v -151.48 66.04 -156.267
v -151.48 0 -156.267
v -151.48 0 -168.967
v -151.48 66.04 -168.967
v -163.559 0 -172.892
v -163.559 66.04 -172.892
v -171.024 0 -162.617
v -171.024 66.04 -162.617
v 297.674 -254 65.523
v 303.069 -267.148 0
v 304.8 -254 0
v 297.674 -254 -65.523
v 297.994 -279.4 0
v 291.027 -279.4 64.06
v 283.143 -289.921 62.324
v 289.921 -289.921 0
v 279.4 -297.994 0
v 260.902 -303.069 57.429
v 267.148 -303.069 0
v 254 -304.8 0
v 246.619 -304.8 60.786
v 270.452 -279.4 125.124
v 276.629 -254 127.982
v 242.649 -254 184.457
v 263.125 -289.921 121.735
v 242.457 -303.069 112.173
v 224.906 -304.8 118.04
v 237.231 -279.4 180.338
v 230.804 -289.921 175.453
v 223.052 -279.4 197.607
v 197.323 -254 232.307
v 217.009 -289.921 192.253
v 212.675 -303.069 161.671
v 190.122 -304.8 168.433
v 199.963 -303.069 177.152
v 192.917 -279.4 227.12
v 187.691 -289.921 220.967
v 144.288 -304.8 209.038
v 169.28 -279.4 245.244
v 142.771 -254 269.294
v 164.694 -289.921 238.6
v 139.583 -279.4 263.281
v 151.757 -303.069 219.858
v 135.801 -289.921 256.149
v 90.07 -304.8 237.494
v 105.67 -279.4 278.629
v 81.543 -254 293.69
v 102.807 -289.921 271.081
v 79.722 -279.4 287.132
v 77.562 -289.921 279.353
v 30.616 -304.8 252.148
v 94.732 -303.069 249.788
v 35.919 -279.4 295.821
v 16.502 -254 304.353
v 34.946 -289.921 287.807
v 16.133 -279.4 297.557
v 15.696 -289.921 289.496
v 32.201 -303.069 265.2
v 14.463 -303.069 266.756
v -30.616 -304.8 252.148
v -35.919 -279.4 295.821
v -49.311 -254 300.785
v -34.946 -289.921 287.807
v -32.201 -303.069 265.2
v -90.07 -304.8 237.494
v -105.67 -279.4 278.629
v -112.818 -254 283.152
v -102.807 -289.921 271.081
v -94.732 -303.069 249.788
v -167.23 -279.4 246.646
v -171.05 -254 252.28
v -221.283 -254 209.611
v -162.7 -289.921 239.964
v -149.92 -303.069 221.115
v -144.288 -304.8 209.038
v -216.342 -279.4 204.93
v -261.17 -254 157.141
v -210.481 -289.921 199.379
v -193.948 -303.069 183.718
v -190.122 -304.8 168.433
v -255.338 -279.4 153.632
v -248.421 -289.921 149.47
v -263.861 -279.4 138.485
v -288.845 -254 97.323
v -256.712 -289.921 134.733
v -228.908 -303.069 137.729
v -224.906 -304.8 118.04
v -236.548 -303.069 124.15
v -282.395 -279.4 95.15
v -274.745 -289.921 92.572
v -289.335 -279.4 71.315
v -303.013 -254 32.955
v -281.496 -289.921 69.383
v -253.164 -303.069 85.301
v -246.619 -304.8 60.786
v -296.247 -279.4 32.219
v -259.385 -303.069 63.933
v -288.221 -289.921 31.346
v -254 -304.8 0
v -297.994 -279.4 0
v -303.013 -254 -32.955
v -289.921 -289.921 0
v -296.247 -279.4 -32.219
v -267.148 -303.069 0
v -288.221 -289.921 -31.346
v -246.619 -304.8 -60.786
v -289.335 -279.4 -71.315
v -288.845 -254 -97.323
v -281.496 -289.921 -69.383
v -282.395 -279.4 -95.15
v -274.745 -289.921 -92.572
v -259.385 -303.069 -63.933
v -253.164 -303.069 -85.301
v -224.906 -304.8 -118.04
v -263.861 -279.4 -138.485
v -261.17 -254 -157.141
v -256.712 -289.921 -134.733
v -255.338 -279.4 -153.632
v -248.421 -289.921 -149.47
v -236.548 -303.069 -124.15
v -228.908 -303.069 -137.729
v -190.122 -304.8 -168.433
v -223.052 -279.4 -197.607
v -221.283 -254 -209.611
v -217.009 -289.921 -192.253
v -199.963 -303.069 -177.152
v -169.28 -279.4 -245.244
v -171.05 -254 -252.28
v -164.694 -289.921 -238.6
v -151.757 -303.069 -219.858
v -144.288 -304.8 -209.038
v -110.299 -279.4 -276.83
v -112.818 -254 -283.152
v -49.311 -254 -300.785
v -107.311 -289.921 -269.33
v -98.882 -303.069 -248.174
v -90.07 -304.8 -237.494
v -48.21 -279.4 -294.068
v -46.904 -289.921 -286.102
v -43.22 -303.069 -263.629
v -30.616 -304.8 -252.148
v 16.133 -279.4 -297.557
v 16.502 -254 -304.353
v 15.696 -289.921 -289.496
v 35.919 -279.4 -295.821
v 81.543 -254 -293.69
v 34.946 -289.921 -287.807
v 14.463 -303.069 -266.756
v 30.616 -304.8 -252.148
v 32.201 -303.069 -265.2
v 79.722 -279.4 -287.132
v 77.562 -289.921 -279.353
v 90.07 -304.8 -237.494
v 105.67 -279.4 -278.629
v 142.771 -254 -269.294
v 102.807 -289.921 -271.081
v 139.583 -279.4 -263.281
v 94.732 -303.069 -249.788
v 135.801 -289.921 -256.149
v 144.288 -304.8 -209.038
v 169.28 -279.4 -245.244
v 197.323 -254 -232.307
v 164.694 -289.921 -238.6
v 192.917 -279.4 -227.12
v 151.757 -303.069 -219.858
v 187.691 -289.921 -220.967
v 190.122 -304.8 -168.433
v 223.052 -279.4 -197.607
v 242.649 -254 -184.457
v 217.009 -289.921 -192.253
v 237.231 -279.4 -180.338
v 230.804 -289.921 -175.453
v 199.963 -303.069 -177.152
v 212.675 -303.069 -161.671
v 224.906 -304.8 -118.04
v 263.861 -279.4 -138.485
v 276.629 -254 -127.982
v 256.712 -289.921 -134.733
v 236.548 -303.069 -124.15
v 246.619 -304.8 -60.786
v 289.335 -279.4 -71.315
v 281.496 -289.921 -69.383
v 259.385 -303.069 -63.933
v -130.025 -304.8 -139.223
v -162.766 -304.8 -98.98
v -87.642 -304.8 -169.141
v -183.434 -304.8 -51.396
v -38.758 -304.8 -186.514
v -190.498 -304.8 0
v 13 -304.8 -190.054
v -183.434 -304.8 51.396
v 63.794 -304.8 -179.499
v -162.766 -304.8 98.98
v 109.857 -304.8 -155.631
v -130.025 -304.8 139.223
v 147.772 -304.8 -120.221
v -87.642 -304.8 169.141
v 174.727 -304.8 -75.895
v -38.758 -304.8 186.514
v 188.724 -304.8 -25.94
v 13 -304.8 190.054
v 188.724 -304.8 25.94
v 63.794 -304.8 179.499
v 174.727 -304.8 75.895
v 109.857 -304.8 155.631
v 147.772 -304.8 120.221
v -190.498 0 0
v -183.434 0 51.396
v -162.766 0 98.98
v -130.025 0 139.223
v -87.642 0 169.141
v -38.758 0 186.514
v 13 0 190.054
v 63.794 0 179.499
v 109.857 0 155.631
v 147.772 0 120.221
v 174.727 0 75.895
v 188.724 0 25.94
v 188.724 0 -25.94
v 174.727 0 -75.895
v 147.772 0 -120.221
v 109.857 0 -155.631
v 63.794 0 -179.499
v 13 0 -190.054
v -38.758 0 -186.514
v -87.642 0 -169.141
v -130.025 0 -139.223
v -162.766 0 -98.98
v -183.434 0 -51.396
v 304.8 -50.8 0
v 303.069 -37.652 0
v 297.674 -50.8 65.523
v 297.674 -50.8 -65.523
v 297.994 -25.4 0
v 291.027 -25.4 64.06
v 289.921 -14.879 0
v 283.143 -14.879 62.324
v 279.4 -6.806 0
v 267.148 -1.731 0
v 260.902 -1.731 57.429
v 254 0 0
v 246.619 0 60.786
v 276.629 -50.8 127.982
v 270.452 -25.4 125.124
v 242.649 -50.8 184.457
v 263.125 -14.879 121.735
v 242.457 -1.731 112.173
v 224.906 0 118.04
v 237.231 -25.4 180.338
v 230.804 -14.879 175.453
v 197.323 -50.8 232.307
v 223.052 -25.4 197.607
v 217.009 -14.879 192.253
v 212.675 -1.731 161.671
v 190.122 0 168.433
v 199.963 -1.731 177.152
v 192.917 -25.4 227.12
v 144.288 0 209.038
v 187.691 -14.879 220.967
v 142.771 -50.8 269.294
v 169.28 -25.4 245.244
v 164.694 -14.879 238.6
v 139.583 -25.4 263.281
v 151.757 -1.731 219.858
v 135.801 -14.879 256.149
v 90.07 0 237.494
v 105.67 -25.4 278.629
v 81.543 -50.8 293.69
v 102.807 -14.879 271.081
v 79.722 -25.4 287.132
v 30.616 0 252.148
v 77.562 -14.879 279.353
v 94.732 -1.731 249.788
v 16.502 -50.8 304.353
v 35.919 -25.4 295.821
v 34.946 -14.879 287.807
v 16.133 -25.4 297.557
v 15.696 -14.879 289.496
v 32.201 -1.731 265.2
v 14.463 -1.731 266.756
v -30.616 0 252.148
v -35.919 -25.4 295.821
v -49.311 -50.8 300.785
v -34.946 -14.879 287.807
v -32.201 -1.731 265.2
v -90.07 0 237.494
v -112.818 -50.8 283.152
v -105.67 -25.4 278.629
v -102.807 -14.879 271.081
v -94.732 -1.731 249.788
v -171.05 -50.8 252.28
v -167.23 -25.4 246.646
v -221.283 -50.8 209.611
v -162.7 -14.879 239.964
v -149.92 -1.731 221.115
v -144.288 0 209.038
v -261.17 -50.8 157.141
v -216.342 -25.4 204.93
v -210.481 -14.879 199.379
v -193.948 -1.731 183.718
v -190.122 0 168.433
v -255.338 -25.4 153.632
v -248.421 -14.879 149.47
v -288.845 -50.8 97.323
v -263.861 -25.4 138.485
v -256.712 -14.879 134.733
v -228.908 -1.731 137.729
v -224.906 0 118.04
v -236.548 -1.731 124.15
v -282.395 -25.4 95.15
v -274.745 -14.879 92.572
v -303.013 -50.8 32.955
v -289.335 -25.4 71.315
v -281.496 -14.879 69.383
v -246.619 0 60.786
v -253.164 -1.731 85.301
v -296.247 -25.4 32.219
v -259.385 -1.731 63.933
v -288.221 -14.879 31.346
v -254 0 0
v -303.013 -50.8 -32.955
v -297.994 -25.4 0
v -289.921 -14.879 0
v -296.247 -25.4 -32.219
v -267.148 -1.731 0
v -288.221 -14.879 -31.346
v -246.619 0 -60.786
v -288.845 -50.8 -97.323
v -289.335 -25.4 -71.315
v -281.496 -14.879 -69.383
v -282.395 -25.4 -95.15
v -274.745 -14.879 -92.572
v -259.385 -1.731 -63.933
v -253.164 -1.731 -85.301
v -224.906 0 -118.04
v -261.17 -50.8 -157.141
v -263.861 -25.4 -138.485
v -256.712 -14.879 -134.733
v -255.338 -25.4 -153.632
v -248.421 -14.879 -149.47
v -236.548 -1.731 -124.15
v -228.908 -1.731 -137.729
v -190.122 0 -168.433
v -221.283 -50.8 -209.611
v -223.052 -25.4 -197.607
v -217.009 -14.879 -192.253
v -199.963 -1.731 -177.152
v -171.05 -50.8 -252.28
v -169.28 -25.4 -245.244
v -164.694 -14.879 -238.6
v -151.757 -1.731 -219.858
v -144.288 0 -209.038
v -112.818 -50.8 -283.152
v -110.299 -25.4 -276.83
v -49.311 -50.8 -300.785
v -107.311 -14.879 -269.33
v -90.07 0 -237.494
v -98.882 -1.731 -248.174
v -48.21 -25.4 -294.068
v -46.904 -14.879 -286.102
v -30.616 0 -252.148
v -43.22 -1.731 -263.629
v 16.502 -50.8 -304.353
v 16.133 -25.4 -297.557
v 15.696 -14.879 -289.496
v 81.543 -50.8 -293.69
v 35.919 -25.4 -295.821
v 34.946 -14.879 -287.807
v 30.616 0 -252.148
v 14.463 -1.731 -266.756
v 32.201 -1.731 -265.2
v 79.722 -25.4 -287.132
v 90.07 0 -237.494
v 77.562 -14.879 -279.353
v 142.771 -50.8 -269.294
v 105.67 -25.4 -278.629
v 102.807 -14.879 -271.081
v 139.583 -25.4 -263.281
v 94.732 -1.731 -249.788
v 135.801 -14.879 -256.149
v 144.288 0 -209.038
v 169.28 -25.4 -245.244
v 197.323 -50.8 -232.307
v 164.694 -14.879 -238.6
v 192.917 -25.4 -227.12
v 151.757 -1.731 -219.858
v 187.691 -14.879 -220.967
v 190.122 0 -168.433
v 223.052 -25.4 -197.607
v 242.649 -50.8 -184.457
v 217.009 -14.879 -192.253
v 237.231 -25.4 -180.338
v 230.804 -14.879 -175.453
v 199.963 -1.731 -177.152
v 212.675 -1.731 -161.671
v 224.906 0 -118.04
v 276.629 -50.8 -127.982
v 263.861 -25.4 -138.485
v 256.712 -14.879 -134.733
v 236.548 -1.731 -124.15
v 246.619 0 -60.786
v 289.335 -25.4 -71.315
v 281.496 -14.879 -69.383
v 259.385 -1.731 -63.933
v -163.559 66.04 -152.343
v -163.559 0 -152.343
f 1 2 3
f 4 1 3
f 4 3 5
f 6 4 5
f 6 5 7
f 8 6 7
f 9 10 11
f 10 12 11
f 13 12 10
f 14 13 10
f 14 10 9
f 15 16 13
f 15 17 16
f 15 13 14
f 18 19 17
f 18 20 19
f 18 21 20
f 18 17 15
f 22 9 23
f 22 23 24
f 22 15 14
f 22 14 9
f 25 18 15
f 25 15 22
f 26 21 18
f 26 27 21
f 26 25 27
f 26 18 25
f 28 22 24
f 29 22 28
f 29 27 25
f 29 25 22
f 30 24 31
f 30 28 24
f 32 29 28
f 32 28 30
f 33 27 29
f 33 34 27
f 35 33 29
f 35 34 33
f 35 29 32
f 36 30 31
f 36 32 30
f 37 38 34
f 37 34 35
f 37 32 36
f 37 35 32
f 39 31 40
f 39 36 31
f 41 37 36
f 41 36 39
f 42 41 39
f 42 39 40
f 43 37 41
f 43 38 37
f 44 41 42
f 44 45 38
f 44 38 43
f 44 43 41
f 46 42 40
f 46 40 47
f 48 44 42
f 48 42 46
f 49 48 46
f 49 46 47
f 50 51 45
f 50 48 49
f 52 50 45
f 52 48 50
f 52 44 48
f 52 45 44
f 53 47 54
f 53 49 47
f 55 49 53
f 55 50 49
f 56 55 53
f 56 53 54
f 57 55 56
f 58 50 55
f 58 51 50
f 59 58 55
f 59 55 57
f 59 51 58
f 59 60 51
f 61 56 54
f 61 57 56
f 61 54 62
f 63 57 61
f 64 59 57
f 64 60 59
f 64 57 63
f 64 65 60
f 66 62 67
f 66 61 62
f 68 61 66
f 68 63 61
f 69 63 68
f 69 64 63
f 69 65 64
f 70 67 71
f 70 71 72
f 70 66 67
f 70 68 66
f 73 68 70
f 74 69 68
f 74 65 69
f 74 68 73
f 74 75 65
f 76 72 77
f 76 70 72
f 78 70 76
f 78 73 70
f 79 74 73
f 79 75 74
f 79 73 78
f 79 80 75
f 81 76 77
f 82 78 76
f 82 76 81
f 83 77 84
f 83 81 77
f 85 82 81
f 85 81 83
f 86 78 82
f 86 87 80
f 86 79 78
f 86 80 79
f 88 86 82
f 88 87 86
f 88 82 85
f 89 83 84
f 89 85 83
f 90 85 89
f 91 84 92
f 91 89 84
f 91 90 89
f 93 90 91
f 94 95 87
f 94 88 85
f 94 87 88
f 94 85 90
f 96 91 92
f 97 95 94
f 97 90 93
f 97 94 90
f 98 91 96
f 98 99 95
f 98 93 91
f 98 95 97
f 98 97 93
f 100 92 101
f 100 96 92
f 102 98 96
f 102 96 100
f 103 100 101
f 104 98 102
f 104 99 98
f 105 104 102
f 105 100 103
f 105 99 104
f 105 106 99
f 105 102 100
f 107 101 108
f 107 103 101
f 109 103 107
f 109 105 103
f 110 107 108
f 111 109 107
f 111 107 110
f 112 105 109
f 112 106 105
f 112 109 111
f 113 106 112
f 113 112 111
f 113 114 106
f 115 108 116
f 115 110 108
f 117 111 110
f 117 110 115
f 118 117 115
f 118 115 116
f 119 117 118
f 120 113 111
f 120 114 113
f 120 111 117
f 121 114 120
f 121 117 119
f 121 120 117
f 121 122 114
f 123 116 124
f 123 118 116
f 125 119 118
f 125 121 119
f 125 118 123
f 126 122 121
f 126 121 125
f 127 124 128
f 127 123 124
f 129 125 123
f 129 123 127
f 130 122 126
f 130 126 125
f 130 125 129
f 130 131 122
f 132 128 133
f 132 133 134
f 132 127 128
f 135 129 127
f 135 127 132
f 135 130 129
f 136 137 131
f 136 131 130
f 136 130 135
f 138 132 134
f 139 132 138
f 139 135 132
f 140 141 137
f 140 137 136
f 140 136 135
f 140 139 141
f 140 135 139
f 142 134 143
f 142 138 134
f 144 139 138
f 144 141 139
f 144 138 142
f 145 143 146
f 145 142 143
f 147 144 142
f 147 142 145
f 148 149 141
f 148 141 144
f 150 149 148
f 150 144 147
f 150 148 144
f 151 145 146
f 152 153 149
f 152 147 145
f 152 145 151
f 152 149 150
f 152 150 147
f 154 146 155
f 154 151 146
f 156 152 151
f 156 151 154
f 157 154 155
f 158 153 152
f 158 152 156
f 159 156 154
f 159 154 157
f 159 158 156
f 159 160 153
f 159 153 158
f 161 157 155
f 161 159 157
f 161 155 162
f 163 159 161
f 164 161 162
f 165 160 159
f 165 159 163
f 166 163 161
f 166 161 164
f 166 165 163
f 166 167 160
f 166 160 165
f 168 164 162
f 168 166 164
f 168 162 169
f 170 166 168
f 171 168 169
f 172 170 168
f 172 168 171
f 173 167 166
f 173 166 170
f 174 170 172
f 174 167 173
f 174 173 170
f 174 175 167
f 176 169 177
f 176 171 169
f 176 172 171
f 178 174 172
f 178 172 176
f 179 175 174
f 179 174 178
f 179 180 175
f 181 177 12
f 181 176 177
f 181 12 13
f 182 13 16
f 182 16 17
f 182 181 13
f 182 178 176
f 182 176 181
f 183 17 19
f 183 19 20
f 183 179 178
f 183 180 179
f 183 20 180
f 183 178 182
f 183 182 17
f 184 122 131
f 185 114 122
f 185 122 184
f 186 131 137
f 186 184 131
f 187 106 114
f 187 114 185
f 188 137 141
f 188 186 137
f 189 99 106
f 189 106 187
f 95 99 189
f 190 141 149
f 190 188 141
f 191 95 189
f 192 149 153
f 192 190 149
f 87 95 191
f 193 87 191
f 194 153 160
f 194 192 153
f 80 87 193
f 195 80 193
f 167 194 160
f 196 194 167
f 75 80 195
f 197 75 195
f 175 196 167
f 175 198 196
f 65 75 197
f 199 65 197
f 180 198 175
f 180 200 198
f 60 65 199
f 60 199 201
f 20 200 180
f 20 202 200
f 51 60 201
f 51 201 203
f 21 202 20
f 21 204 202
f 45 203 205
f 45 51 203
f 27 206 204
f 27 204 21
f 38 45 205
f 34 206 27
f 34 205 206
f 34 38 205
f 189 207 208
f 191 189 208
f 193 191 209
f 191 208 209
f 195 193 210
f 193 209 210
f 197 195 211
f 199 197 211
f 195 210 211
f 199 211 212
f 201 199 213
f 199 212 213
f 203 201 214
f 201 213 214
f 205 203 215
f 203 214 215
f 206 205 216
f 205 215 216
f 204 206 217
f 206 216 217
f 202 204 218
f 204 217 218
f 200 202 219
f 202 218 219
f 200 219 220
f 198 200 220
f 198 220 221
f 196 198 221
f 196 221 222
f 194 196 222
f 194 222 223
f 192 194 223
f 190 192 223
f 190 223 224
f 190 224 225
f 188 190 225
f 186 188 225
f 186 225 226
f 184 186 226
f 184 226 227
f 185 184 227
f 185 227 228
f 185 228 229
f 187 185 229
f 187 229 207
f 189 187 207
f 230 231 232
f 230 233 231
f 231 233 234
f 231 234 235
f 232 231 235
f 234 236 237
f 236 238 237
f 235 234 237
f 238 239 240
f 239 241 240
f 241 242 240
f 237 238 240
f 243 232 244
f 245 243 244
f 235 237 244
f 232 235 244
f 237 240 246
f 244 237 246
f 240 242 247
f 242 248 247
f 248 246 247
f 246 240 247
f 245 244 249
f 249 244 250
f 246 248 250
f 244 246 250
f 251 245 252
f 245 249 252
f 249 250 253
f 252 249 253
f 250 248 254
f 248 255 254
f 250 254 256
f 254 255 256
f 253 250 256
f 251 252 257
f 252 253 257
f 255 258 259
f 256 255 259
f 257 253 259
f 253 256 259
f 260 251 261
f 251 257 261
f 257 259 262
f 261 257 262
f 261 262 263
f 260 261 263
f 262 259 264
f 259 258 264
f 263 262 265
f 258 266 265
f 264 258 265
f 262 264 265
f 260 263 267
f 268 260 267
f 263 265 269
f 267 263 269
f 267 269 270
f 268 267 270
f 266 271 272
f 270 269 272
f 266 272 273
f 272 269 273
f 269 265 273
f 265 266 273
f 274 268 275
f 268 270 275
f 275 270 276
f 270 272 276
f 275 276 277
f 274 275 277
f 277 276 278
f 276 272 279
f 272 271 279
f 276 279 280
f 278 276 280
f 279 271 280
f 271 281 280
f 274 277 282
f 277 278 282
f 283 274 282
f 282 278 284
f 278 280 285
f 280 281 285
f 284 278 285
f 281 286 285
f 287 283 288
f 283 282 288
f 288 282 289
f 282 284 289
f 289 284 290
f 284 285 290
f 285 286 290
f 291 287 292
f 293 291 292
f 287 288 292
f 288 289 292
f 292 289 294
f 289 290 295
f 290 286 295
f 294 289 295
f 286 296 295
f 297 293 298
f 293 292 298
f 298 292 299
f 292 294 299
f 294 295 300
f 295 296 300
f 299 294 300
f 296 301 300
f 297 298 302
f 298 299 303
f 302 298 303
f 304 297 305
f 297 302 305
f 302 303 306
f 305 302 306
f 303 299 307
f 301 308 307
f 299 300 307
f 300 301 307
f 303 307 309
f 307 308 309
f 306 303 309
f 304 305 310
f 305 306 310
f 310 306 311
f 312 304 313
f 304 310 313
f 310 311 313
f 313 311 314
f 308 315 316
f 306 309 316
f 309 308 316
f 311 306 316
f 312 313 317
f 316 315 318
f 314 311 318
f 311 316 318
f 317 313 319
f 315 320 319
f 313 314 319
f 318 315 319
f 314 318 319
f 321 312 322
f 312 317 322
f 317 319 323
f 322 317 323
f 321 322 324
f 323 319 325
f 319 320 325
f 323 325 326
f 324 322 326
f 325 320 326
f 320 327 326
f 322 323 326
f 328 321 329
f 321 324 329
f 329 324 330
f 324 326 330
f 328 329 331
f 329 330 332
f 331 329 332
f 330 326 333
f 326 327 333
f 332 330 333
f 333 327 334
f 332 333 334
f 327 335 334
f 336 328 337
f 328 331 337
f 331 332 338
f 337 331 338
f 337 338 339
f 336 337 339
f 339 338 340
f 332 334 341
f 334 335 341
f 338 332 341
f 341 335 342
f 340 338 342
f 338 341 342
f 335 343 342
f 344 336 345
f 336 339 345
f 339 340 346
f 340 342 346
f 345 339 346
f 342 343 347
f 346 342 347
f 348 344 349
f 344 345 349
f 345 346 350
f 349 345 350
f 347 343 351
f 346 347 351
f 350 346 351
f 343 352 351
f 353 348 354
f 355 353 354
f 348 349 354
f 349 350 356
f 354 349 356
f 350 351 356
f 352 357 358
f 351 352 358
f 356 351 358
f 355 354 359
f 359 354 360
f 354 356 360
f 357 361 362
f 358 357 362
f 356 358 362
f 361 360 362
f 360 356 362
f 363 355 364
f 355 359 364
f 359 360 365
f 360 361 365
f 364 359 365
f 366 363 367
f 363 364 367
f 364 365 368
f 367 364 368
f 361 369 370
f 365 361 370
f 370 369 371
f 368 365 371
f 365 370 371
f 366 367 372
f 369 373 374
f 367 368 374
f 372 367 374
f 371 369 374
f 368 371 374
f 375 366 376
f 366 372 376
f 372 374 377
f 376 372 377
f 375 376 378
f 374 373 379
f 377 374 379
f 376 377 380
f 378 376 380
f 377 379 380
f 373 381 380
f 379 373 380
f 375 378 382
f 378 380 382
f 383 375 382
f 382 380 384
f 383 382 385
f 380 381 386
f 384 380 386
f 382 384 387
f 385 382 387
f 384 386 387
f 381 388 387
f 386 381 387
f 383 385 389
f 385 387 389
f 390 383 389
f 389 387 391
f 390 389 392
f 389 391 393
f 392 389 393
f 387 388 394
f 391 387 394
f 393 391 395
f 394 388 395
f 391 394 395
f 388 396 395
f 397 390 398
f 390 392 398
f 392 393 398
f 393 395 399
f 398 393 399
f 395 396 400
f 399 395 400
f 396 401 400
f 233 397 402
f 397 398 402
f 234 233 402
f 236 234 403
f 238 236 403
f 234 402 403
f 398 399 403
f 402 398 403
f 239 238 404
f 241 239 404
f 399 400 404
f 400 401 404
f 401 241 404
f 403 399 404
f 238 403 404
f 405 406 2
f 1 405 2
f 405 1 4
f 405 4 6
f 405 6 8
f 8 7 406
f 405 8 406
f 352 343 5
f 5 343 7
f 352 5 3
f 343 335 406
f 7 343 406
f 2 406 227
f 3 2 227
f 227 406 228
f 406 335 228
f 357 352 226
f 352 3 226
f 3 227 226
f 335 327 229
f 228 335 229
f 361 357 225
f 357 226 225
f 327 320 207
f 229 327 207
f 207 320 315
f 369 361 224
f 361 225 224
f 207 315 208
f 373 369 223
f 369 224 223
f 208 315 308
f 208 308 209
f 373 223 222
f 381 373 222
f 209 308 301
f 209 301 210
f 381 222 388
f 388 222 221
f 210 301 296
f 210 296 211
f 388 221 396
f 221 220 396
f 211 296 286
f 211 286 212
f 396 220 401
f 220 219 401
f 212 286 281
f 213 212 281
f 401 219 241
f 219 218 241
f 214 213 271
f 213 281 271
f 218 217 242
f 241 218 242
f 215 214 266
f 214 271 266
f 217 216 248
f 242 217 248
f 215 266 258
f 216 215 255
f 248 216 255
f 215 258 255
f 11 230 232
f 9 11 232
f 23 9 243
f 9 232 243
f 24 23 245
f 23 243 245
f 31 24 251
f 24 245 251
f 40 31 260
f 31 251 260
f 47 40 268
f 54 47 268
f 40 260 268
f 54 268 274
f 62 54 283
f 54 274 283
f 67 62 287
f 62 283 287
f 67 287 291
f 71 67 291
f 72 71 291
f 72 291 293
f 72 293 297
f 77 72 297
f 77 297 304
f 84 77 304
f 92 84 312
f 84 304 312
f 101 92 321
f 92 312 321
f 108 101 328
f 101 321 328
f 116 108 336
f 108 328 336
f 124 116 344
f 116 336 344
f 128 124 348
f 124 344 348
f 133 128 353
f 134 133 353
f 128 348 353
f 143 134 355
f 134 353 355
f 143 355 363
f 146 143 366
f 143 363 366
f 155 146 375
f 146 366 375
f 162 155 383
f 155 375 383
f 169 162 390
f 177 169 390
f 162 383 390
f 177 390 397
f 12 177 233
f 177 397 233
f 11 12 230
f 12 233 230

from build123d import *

# Parameters (mm, degrees)
F0_R     = 304.8
F1_DEPTH = 304.8
F2_R     = 190.498437
F3_DEPTH = 645.16
F4_R     = 50.8
F6_DEPTH = 66.04


with BuildPart() as f1:
    # F0 (on Front) → F1 (new body)
    with BuildSketch(Plane.XZ):
        Circle(F0_R)
    extrude(amount=F1_DEPTH)

    # F2 (on face) → F3 (cut)
    with BuildSketch(Plane(origin=(0, 0, 0), x_dir=(-1, 0, 0), z_dir=(0, 1, 0))):
        Circle(F2_R)
    extrude(amount=-F3_DEPTH, mode=Mode.SUBTRACT)

    # F4
    f4_edges = [f1.edges().sort_by_distance(p)[0] for p in [
        (-304.8, -304.8, 0),
        (-304.8, 0, 0),
    ]]
    fillet(f4_edges, radius=F4_R)

    # F5 (on face) → F6 (join)
    with BuildSketch(Plane(origin=(0, 0, 0), x_dir=(-1, 0, 0), z_dir=(0, 1, 0))):
        Polygon((151.48038, -156.267236), (151.48038, -168.967236), (163.558798, -172.891752), (171.023671, -162.617236), (163.558798, -152.342721), align=None)
    extrude(amount=F6_DEPTH)


solid = f1.part
